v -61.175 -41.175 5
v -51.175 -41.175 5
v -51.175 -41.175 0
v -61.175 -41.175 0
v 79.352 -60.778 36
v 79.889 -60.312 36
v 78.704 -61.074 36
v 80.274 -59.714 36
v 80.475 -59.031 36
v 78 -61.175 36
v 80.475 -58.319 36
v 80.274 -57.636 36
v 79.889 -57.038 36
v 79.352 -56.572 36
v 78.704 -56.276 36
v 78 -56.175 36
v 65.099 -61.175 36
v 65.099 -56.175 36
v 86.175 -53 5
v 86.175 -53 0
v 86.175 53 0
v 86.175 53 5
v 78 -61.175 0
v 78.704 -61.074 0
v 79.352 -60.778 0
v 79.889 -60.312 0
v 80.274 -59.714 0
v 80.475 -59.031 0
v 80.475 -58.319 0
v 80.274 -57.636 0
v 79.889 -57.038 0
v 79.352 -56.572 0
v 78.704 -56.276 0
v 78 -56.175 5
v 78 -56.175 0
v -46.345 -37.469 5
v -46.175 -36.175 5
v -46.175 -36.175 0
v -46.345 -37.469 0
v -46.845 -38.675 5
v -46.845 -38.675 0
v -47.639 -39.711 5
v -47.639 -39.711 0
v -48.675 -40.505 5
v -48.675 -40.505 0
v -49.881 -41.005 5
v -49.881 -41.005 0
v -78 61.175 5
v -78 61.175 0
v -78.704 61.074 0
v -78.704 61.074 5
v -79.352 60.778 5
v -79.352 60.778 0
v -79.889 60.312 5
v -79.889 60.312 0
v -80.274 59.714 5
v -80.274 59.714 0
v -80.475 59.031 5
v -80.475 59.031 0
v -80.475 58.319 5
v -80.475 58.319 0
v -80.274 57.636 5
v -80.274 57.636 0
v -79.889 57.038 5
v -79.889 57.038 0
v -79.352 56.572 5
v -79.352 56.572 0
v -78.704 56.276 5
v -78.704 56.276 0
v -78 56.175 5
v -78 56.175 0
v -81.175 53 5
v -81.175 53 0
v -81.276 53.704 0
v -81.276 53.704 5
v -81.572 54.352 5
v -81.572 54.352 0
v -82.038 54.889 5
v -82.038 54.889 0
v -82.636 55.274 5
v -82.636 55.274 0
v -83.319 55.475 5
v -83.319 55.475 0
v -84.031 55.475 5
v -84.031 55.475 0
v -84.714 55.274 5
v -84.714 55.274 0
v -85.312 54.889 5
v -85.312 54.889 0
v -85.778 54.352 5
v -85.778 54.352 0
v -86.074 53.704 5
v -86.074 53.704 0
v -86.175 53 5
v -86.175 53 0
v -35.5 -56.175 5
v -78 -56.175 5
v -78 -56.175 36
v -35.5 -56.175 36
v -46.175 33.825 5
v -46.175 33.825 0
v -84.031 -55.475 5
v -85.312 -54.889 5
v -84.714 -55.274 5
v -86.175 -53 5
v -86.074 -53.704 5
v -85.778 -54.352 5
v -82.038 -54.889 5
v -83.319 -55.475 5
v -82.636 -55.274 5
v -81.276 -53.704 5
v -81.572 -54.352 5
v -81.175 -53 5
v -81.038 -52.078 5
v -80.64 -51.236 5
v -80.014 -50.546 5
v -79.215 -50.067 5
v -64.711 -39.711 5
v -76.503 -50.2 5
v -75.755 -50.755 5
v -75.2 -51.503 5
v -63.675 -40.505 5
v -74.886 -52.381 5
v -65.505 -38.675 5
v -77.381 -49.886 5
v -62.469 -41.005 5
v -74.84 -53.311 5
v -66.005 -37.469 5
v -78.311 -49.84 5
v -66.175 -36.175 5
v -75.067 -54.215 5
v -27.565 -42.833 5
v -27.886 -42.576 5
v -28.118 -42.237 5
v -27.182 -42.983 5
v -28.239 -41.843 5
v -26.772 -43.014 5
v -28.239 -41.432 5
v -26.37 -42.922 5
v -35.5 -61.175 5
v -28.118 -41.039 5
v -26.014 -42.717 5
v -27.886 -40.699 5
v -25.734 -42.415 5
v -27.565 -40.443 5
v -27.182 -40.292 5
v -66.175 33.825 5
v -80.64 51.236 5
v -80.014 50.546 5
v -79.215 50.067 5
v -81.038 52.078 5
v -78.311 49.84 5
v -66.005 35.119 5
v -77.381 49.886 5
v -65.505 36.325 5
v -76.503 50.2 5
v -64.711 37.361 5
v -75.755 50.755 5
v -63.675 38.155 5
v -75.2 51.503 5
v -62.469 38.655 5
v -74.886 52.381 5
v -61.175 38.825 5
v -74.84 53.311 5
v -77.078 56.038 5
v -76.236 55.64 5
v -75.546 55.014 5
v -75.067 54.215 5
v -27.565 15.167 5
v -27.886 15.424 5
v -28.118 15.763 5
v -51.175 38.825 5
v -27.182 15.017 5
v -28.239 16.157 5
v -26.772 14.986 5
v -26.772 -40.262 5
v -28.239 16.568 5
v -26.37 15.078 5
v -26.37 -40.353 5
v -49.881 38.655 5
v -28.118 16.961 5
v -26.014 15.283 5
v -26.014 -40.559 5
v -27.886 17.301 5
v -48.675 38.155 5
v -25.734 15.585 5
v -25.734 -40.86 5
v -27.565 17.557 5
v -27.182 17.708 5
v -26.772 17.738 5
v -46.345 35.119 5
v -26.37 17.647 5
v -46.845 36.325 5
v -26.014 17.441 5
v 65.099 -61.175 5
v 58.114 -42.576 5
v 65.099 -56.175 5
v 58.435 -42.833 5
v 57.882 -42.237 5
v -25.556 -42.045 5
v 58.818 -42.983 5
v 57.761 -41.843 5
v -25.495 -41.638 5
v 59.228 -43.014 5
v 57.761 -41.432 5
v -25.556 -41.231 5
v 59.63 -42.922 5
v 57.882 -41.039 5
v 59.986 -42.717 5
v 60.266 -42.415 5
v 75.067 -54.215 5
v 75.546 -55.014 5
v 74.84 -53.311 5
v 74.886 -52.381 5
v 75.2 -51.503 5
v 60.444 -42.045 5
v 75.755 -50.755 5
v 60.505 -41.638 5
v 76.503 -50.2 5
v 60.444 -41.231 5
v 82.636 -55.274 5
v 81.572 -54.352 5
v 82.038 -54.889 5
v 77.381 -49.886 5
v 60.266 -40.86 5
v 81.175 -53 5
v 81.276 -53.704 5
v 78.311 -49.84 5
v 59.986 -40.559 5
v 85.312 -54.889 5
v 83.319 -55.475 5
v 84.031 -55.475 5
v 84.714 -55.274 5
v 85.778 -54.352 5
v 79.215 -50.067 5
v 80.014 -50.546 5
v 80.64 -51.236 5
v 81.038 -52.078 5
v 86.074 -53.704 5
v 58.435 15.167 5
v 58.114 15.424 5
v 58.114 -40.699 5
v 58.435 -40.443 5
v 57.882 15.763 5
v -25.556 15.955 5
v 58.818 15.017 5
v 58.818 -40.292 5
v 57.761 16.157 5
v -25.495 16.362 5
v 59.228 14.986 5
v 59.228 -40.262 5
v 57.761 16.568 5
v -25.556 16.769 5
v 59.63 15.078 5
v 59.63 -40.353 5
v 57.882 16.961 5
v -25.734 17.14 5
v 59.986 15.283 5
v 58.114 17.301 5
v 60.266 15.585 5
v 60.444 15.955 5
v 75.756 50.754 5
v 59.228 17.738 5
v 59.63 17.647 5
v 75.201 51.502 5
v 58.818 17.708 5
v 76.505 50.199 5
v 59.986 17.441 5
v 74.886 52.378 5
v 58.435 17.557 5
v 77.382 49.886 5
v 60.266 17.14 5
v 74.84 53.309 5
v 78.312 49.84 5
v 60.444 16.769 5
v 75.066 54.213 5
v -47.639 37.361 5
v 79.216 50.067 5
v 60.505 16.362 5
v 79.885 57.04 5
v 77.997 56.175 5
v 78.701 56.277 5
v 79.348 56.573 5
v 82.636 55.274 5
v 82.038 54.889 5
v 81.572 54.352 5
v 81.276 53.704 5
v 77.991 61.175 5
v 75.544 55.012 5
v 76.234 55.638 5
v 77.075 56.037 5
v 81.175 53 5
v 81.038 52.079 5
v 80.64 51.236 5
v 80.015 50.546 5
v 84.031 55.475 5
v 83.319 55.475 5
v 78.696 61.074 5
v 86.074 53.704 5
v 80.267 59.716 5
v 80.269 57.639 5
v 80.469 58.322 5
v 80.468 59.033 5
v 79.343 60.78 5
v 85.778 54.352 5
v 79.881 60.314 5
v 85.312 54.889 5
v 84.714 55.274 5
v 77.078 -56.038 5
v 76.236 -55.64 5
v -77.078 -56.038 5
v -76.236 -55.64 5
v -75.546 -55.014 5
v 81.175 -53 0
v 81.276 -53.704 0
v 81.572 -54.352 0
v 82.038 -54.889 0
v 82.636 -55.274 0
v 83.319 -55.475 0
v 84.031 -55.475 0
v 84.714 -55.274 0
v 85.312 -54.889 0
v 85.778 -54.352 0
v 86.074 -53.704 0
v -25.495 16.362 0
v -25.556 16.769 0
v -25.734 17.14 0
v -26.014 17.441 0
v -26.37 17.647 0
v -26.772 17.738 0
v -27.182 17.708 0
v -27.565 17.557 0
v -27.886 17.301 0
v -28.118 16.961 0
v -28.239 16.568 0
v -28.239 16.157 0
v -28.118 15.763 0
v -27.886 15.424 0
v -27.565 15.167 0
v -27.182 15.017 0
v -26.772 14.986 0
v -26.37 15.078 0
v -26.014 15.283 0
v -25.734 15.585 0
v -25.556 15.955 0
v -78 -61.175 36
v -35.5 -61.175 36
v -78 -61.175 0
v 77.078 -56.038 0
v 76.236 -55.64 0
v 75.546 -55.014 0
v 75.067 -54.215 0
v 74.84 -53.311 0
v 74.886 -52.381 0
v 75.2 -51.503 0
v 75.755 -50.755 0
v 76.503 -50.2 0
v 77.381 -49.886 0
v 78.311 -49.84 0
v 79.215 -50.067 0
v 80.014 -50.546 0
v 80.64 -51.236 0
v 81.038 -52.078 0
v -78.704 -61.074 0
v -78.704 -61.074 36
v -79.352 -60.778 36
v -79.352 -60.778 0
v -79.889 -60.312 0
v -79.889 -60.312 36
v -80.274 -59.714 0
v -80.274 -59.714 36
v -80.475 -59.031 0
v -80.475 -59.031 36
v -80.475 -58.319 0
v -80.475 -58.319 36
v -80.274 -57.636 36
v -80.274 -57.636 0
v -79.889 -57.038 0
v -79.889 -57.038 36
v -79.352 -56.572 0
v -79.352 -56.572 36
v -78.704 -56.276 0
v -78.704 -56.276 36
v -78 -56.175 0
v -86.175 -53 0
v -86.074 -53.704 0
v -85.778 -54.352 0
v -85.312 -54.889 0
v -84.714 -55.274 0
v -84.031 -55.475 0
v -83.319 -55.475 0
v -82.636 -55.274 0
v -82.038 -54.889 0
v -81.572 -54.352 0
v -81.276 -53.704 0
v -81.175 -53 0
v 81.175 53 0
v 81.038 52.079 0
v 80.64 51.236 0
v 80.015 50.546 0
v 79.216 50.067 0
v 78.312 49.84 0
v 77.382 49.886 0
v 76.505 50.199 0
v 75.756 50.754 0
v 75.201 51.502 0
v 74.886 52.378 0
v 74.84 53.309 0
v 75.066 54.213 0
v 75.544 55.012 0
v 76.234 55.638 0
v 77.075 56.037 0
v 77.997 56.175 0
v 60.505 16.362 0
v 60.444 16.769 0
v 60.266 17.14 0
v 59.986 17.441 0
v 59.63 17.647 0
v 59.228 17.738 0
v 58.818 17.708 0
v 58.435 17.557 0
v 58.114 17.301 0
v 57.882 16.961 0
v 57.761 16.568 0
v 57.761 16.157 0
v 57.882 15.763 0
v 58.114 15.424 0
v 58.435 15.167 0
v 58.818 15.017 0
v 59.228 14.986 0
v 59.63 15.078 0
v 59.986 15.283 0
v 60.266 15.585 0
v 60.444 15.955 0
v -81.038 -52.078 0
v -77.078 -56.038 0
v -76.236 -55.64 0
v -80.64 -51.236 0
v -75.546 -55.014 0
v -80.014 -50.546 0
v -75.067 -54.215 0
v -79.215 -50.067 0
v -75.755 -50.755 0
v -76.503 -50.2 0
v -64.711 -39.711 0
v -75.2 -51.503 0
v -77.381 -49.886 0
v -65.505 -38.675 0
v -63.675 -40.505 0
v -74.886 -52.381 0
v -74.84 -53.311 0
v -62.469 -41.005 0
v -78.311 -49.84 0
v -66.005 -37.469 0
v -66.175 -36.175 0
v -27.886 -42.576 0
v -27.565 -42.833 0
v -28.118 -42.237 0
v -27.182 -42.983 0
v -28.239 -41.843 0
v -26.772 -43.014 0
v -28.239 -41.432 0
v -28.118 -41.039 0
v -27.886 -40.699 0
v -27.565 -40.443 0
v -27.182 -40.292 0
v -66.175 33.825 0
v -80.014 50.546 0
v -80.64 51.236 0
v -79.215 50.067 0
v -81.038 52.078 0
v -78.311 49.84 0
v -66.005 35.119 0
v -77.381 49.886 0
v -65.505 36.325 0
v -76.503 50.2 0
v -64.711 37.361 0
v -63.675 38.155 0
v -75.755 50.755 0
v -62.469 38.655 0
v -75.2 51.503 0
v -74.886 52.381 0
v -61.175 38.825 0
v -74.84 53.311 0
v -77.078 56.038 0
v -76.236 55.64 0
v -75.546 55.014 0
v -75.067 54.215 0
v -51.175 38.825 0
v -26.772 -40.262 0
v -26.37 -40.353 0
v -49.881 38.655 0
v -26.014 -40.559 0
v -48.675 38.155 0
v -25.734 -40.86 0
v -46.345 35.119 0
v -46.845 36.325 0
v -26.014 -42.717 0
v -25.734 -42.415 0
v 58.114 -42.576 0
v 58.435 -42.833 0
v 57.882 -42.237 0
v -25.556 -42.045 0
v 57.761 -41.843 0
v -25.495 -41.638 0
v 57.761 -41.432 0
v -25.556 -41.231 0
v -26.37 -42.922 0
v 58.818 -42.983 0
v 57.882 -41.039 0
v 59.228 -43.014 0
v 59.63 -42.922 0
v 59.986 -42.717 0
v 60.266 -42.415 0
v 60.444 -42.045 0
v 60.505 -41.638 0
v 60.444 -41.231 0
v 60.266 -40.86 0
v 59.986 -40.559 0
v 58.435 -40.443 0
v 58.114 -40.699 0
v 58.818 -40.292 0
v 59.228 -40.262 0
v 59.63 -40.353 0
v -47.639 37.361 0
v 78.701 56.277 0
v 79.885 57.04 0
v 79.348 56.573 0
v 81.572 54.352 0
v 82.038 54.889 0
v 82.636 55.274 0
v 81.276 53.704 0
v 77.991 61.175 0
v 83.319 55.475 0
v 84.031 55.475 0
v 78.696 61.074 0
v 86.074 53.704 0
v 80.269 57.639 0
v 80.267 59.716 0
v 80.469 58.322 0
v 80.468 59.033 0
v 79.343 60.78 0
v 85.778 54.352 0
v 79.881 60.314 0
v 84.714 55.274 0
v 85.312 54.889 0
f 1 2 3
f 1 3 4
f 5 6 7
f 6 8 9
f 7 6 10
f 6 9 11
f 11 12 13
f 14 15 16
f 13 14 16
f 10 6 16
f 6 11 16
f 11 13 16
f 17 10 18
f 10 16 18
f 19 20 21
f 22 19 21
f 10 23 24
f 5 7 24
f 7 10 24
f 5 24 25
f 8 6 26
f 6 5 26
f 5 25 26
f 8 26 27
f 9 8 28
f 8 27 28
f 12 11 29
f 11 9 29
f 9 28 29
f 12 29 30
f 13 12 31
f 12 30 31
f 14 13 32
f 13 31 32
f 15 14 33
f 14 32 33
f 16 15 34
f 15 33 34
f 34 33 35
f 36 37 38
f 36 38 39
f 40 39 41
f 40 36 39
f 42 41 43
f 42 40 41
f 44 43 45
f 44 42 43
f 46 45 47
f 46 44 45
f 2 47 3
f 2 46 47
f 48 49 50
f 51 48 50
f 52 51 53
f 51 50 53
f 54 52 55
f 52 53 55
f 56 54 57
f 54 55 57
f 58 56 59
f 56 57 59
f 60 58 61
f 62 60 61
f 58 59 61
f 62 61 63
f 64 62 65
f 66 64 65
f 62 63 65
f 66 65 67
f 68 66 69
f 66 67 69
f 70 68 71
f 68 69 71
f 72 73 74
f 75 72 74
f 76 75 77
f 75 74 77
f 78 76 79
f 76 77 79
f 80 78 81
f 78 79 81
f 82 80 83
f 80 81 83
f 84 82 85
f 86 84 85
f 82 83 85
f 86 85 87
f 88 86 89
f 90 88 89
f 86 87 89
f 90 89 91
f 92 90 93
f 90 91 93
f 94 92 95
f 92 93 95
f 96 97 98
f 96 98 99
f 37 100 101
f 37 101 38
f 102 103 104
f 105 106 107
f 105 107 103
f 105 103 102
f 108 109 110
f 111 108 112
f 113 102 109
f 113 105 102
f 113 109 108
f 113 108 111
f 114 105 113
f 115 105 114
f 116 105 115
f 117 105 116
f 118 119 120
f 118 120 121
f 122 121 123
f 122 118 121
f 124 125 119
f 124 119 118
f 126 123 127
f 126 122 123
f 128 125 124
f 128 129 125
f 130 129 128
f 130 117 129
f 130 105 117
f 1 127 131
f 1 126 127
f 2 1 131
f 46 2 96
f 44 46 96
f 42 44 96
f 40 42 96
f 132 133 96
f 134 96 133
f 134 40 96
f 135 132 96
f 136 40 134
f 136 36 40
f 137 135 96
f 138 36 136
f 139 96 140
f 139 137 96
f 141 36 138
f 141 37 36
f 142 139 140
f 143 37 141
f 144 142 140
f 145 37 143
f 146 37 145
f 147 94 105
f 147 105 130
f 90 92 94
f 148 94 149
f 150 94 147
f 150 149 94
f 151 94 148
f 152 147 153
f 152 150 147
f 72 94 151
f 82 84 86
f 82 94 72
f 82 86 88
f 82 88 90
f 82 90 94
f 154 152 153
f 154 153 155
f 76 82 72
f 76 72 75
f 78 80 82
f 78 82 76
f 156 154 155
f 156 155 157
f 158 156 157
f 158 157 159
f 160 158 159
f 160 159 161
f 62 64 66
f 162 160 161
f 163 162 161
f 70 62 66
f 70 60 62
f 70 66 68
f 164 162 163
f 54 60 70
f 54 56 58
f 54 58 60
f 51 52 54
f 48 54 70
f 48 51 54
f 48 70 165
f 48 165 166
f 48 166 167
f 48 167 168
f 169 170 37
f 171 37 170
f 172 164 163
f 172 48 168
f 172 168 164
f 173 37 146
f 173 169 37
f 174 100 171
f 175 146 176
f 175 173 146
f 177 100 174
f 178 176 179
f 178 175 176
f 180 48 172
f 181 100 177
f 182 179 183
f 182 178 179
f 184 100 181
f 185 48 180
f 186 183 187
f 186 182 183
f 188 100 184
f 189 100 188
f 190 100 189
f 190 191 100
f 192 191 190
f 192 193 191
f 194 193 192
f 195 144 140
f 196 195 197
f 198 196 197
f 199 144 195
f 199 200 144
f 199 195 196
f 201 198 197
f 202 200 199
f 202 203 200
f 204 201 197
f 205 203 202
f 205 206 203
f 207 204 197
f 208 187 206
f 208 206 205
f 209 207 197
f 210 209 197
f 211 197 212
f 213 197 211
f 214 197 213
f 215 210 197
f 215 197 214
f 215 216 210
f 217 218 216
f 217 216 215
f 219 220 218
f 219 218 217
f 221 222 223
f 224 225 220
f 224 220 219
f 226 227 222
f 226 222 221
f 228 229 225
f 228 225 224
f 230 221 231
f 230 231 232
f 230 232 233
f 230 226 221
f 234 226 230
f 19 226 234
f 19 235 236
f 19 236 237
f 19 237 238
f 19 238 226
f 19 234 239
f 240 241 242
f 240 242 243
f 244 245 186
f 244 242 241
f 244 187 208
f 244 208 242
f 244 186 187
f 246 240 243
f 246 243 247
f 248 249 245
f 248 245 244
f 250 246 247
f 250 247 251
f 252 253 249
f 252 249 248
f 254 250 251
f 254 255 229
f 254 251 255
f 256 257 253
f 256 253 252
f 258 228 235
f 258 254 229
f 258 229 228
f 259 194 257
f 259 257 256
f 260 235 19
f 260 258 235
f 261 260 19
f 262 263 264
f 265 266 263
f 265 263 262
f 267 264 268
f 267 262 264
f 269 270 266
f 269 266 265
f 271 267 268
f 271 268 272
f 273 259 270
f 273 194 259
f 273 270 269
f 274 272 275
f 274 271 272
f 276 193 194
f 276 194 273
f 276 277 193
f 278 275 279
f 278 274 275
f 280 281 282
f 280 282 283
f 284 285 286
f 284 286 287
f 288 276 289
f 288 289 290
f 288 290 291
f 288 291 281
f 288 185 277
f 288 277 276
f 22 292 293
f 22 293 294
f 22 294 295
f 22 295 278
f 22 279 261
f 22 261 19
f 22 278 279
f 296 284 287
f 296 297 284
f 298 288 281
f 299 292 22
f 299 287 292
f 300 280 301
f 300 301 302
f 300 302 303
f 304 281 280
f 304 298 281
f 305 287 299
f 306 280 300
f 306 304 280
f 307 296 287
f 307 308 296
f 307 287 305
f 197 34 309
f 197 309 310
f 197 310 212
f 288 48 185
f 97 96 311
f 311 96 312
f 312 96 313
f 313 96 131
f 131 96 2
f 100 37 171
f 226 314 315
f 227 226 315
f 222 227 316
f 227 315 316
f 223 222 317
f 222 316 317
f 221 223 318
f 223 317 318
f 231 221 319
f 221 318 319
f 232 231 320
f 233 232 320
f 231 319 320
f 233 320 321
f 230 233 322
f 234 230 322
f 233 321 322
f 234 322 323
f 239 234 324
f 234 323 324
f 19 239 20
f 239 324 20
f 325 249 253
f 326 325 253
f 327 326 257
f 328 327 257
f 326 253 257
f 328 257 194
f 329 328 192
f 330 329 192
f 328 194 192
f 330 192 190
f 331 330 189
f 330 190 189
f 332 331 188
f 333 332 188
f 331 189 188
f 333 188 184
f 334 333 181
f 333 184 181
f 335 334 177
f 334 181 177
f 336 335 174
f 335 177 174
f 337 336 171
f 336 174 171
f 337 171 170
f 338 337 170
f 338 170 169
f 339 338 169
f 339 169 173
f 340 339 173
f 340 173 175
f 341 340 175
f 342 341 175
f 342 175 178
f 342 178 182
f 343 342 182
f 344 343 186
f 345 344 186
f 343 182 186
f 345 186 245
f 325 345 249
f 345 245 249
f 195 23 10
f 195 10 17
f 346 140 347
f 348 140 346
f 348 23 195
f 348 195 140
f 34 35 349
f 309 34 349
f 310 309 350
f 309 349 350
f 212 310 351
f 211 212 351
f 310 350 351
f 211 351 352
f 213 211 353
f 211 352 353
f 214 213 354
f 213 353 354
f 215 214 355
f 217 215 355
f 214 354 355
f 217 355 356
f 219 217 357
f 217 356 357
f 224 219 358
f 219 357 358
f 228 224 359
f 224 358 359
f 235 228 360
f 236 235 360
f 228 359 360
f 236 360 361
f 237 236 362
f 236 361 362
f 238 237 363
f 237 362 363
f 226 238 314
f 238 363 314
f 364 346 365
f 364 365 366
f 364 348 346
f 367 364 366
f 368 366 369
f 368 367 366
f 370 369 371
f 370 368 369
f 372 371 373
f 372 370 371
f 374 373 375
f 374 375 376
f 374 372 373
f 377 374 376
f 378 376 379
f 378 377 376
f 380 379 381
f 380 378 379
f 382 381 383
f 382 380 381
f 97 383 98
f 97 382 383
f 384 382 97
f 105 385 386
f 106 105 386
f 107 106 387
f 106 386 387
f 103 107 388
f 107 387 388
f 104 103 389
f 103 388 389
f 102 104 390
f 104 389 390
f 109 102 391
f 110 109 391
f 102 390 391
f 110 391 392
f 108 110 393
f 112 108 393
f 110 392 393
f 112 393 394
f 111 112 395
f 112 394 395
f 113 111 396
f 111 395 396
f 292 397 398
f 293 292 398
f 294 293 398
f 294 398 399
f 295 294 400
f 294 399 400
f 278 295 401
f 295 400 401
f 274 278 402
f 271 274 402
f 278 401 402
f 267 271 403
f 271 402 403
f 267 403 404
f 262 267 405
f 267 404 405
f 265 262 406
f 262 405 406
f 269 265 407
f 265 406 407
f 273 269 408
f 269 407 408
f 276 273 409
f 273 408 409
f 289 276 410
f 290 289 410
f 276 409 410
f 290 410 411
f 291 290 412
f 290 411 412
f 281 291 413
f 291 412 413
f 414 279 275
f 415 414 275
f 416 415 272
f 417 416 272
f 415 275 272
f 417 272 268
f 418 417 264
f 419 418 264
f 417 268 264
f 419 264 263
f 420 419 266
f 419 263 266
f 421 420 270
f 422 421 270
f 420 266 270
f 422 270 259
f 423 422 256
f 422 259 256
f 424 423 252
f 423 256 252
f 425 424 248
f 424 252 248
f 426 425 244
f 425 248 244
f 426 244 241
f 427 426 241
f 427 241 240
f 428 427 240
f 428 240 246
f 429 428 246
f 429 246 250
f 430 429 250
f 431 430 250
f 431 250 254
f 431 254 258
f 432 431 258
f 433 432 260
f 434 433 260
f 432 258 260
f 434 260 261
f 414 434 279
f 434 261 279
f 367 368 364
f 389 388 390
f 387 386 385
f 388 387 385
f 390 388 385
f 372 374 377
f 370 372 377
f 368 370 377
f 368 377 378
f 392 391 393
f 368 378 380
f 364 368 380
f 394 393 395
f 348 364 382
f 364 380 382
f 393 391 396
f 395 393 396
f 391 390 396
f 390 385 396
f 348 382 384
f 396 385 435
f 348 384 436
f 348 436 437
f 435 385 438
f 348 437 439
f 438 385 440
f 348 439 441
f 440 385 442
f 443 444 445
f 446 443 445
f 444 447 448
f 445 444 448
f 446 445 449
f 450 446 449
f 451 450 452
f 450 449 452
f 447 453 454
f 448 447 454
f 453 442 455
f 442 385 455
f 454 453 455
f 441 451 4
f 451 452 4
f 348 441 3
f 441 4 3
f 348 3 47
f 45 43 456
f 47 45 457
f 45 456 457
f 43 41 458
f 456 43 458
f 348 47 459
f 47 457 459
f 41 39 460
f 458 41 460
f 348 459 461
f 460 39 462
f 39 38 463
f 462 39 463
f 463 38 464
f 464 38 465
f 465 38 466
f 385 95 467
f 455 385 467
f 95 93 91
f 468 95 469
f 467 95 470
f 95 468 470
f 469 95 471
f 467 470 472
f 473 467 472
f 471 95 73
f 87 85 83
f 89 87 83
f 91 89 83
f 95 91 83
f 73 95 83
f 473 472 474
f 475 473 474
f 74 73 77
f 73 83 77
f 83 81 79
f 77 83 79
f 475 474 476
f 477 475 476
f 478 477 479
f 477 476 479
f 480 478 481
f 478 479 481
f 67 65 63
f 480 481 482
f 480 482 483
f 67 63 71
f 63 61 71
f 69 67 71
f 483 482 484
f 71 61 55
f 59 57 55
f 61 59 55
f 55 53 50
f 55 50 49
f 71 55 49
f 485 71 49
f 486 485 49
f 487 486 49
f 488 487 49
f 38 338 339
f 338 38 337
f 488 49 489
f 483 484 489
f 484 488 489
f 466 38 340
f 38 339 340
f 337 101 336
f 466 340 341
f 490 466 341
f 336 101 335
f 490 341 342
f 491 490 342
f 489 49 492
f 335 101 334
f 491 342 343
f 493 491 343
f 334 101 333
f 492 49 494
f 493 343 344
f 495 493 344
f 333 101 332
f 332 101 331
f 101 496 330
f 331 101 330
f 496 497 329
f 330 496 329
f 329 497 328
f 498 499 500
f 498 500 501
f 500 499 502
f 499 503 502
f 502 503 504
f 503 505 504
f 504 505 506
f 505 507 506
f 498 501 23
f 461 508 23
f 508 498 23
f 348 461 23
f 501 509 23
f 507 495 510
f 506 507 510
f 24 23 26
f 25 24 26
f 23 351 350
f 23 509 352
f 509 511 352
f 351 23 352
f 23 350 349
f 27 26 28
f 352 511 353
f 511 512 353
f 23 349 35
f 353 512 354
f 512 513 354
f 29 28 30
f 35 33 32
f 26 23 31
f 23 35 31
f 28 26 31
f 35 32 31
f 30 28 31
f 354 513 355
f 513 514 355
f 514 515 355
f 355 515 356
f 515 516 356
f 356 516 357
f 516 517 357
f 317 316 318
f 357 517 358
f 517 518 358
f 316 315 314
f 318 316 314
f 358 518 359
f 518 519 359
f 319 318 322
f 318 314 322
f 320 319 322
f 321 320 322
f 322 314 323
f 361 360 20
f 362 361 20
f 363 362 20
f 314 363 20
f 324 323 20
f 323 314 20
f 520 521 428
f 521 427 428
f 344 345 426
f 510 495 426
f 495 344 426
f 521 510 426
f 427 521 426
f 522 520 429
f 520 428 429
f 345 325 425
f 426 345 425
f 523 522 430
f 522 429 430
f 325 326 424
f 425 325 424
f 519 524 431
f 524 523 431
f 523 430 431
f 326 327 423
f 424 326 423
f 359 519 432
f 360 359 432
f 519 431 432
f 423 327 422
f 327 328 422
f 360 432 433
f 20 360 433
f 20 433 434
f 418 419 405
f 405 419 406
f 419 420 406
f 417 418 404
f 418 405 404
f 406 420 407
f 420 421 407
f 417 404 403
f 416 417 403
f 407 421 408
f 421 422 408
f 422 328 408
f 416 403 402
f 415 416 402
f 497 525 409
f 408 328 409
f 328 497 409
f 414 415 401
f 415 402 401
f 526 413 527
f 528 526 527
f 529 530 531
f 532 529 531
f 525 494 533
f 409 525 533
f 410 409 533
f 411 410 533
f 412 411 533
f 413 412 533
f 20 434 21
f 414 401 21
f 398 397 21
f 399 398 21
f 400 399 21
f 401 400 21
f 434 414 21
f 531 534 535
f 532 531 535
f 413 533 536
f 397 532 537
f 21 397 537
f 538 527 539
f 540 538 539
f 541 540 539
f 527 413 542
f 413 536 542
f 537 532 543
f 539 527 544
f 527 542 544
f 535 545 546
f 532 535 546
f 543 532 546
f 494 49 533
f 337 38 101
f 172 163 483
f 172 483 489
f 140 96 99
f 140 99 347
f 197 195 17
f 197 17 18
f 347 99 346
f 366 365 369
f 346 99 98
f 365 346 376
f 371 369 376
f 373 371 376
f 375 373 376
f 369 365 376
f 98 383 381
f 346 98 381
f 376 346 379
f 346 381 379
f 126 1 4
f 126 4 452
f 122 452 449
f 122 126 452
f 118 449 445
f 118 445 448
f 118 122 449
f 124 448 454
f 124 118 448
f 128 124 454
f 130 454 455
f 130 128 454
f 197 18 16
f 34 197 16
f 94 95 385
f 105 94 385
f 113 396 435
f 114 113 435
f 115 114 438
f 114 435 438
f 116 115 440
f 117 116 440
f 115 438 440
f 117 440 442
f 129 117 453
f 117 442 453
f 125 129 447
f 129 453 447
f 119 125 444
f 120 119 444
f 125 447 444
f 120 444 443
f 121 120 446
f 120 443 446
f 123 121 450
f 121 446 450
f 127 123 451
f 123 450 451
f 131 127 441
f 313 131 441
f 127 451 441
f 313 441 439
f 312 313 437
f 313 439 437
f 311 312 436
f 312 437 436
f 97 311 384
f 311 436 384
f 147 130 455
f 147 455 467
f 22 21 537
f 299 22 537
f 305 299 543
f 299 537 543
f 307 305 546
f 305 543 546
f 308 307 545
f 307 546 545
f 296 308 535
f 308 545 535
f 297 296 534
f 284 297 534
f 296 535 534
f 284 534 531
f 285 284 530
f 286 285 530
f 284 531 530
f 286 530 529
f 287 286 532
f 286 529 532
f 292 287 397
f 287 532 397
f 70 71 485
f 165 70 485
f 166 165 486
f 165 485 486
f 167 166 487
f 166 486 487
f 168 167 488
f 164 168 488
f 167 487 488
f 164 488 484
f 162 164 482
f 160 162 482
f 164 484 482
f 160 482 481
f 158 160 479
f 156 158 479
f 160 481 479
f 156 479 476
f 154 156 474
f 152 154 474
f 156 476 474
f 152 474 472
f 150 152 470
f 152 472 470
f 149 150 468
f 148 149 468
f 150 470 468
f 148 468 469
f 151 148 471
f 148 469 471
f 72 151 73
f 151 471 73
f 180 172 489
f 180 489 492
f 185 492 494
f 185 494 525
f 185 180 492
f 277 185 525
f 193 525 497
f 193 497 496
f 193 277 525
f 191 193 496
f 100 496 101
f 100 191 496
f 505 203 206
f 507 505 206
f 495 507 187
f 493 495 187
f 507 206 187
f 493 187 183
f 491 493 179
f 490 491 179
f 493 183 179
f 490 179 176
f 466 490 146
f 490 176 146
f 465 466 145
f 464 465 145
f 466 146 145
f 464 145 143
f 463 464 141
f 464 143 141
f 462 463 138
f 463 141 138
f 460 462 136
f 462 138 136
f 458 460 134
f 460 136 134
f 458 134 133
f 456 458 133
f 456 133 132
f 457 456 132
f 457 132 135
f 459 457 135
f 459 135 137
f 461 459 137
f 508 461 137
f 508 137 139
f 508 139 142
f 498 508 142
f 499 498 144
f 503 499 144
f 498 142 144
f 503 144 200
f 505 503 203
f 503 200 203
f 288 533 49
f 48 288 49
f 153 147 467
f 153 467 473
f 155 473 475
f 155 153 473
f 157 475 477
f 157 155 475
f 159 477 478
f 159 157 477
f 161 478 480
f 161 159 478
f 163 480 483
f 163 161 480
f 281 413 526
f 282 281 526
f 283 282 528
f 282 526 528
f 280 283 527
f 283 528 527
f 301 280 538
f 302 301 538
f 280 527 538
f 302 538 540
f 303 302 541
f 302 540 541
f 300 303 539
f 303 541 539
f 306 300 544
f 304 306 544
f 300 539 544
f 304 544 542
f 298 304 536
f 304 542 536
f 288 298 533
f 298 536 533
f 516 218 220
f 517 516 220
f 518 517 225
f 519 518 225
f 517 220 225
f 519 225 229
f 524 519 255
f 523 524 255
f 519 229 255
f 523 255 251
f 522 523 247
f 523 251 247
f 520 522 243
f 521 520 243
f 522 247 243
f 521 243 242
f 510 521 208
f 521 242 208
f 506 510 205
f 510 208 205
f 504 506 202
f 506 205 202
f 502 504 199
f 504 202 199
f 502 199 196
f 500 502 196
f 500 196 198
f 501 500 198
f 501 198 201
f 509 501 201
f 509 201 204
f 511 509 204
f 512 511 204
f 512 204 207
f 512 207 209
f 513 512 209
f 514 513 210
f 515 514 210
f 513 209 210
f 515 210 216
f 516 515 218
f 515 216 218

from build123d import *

# Parameters (mm, degrees)
RESSALTO_EXTRUS_O1_DEPTH = 5
RESSALTO_EXTRUS_O2_DEPTH = 31
ESBO_O3_R                = 1.38
CORTE_EXTRUS_O1_DEPTH    = 5
CORTE_EXTRUS_O2_DEPTH    = 5


with BuildPart() as part:
    # Esboço1 → Ressalto-extrusão1 (new body)
    with BuildSketch(Plane.XY):
        with BuildLine():
            Line((-78, -61.175), (78, -61.175))
            ThreePointArc((78, -61.175), (80.5, -58.675), (78, -56.175))
            ThreePointArc((78, -56.175), (75.75493597, -50.75493597), (81.175, -53))
            ThreePointArc((81.175, -53), (83.675, -55.5), (86.175, -53))
            Line((86.175, -53), (86.175, 53))
            ThreePointArc((86.175, 53), (83.675, 55.5), (81.175, 53))
            ThreePointArc((81.175, 53), (75.756150129, 50.753722467), (77.996566768, 56.174998144))
            ThreePointArc((77.996566768, 56.174998144), (80.493861975, 58.677700014), (77.991160104, 61.174995221))
            Line((77.991160104, 61.174995221), (-78, 61.174995221))
            ThreePointArc((-78, 61.174995221), (-80.5, 58.674995221), (-78, 56.174995221))
            ThreePointArc((-78, 56.174995221), (-75.75493597, 50.75493119), (-81.175, 52.999995221))
            ThreePointArc((-81.175, 52.999995221), (-83.675, 55.499995221), (-86.175, 52.999995221))
            Line((-86.175, 52.999995221), (-86.175, -53))
            ThreePointArc((-86.175, -53), (-83.675, -55.5), (-81.175, -53))
            ThreePointArc((-81.175, -53), (-75.75493597, -50.75493597), (-78, -56.175))
            ThreePointArc((-78, -56.175), (-80.5, -58.675), (-78, -61.175))
        make_face()
    extrude(amount=RESSALTO_EXTRUS_O1_DEPTH)

    # Esboço2 → Ressalto-extrusão2 (add)
    with BuildSketch(Plane.XY.offset(5)):
        with BuildLine():
            Line((-78, -56.175), (-35.5, -56.175))
            Line((-35.5, -56.175), (-35.5, -60.212223694))
            Line((-35.5, -60.212223694), (-35.5, -61.175))
            Line((-35.5, -61.175), (-78, -61.175))
            ThreePointArc((-78, -61.175), (-80.5, -58.675), (-78, -56.175))
        make_face()
        with BuildLine():
            Line((78, -61.175), (65.099265532, -61.175))
            Line((65.099265532, -61.175), (65.099265532, -56.175))
            Line((65.099265532, -56.175), (78, -56.175))
            ThreePointArc((78, -56.175), (80.5, -58.675), (78, -61.175))
        make_face()
    extrude(amount=RESSALTO_EXTRUS_O2_DEPTH)

    # Esboço3 → Corte-extrusão1 (cut)
    with BuildSketch(Plane.XY.offset(5)):
        with Locations((59.125349465, -41.637776306)):
            Circle(ESBO_O3_R)
        with Locations((59.125349465, 16.362223694)):
            Circle(ESBO_O3_R)
        with Locations((-26.874650535, -41.637776306)):
            Circle(ESBO_O3_R)
        with Locations((-26.874650535, 16.362223694)):
            Circle(ESBO_O3_R)
    extrude(amount=-CORTE_EXTRUS_O1_DEPTH, mode=Mode.SUBTRACT)

    # Esboço4 → Corte-extrusão2 (cut)
    with BuildSketch(Plane.XY.offset(5)):
        with BuildLine():
            Line((-61.175, 38.825), (-51.175, 38.825))
            ThreePointArc((-51.175, 38.825), (-47.639466094, 37.360533906), (-46.175, 33.825))
            Line((-46.175, 33.825), (-46.175, -36.175))
            ThreePointArc((-46.175, -36.175), (-47.639466094, -39.710533906), (-51.175, -41.175))
            Line((-51.175, -41.175), (-61.175, -41.175))
            ThreePointArc((-61.175, -41.175), (-64.710533906, -39.710533906), (-66.175, -36.175))
            Line((-66.175, -36.175), (-66.175, 33.825))
            ThreePointArc((-66.175, 33.825), (-64.710533906, 37.360533906), (-61.175, 38.825))
        make_face()
    extrude(amount=-CORTE_EXTRUS_O2_DEPTH, mode=Mode.SUBTRACT)


solid = part.part
